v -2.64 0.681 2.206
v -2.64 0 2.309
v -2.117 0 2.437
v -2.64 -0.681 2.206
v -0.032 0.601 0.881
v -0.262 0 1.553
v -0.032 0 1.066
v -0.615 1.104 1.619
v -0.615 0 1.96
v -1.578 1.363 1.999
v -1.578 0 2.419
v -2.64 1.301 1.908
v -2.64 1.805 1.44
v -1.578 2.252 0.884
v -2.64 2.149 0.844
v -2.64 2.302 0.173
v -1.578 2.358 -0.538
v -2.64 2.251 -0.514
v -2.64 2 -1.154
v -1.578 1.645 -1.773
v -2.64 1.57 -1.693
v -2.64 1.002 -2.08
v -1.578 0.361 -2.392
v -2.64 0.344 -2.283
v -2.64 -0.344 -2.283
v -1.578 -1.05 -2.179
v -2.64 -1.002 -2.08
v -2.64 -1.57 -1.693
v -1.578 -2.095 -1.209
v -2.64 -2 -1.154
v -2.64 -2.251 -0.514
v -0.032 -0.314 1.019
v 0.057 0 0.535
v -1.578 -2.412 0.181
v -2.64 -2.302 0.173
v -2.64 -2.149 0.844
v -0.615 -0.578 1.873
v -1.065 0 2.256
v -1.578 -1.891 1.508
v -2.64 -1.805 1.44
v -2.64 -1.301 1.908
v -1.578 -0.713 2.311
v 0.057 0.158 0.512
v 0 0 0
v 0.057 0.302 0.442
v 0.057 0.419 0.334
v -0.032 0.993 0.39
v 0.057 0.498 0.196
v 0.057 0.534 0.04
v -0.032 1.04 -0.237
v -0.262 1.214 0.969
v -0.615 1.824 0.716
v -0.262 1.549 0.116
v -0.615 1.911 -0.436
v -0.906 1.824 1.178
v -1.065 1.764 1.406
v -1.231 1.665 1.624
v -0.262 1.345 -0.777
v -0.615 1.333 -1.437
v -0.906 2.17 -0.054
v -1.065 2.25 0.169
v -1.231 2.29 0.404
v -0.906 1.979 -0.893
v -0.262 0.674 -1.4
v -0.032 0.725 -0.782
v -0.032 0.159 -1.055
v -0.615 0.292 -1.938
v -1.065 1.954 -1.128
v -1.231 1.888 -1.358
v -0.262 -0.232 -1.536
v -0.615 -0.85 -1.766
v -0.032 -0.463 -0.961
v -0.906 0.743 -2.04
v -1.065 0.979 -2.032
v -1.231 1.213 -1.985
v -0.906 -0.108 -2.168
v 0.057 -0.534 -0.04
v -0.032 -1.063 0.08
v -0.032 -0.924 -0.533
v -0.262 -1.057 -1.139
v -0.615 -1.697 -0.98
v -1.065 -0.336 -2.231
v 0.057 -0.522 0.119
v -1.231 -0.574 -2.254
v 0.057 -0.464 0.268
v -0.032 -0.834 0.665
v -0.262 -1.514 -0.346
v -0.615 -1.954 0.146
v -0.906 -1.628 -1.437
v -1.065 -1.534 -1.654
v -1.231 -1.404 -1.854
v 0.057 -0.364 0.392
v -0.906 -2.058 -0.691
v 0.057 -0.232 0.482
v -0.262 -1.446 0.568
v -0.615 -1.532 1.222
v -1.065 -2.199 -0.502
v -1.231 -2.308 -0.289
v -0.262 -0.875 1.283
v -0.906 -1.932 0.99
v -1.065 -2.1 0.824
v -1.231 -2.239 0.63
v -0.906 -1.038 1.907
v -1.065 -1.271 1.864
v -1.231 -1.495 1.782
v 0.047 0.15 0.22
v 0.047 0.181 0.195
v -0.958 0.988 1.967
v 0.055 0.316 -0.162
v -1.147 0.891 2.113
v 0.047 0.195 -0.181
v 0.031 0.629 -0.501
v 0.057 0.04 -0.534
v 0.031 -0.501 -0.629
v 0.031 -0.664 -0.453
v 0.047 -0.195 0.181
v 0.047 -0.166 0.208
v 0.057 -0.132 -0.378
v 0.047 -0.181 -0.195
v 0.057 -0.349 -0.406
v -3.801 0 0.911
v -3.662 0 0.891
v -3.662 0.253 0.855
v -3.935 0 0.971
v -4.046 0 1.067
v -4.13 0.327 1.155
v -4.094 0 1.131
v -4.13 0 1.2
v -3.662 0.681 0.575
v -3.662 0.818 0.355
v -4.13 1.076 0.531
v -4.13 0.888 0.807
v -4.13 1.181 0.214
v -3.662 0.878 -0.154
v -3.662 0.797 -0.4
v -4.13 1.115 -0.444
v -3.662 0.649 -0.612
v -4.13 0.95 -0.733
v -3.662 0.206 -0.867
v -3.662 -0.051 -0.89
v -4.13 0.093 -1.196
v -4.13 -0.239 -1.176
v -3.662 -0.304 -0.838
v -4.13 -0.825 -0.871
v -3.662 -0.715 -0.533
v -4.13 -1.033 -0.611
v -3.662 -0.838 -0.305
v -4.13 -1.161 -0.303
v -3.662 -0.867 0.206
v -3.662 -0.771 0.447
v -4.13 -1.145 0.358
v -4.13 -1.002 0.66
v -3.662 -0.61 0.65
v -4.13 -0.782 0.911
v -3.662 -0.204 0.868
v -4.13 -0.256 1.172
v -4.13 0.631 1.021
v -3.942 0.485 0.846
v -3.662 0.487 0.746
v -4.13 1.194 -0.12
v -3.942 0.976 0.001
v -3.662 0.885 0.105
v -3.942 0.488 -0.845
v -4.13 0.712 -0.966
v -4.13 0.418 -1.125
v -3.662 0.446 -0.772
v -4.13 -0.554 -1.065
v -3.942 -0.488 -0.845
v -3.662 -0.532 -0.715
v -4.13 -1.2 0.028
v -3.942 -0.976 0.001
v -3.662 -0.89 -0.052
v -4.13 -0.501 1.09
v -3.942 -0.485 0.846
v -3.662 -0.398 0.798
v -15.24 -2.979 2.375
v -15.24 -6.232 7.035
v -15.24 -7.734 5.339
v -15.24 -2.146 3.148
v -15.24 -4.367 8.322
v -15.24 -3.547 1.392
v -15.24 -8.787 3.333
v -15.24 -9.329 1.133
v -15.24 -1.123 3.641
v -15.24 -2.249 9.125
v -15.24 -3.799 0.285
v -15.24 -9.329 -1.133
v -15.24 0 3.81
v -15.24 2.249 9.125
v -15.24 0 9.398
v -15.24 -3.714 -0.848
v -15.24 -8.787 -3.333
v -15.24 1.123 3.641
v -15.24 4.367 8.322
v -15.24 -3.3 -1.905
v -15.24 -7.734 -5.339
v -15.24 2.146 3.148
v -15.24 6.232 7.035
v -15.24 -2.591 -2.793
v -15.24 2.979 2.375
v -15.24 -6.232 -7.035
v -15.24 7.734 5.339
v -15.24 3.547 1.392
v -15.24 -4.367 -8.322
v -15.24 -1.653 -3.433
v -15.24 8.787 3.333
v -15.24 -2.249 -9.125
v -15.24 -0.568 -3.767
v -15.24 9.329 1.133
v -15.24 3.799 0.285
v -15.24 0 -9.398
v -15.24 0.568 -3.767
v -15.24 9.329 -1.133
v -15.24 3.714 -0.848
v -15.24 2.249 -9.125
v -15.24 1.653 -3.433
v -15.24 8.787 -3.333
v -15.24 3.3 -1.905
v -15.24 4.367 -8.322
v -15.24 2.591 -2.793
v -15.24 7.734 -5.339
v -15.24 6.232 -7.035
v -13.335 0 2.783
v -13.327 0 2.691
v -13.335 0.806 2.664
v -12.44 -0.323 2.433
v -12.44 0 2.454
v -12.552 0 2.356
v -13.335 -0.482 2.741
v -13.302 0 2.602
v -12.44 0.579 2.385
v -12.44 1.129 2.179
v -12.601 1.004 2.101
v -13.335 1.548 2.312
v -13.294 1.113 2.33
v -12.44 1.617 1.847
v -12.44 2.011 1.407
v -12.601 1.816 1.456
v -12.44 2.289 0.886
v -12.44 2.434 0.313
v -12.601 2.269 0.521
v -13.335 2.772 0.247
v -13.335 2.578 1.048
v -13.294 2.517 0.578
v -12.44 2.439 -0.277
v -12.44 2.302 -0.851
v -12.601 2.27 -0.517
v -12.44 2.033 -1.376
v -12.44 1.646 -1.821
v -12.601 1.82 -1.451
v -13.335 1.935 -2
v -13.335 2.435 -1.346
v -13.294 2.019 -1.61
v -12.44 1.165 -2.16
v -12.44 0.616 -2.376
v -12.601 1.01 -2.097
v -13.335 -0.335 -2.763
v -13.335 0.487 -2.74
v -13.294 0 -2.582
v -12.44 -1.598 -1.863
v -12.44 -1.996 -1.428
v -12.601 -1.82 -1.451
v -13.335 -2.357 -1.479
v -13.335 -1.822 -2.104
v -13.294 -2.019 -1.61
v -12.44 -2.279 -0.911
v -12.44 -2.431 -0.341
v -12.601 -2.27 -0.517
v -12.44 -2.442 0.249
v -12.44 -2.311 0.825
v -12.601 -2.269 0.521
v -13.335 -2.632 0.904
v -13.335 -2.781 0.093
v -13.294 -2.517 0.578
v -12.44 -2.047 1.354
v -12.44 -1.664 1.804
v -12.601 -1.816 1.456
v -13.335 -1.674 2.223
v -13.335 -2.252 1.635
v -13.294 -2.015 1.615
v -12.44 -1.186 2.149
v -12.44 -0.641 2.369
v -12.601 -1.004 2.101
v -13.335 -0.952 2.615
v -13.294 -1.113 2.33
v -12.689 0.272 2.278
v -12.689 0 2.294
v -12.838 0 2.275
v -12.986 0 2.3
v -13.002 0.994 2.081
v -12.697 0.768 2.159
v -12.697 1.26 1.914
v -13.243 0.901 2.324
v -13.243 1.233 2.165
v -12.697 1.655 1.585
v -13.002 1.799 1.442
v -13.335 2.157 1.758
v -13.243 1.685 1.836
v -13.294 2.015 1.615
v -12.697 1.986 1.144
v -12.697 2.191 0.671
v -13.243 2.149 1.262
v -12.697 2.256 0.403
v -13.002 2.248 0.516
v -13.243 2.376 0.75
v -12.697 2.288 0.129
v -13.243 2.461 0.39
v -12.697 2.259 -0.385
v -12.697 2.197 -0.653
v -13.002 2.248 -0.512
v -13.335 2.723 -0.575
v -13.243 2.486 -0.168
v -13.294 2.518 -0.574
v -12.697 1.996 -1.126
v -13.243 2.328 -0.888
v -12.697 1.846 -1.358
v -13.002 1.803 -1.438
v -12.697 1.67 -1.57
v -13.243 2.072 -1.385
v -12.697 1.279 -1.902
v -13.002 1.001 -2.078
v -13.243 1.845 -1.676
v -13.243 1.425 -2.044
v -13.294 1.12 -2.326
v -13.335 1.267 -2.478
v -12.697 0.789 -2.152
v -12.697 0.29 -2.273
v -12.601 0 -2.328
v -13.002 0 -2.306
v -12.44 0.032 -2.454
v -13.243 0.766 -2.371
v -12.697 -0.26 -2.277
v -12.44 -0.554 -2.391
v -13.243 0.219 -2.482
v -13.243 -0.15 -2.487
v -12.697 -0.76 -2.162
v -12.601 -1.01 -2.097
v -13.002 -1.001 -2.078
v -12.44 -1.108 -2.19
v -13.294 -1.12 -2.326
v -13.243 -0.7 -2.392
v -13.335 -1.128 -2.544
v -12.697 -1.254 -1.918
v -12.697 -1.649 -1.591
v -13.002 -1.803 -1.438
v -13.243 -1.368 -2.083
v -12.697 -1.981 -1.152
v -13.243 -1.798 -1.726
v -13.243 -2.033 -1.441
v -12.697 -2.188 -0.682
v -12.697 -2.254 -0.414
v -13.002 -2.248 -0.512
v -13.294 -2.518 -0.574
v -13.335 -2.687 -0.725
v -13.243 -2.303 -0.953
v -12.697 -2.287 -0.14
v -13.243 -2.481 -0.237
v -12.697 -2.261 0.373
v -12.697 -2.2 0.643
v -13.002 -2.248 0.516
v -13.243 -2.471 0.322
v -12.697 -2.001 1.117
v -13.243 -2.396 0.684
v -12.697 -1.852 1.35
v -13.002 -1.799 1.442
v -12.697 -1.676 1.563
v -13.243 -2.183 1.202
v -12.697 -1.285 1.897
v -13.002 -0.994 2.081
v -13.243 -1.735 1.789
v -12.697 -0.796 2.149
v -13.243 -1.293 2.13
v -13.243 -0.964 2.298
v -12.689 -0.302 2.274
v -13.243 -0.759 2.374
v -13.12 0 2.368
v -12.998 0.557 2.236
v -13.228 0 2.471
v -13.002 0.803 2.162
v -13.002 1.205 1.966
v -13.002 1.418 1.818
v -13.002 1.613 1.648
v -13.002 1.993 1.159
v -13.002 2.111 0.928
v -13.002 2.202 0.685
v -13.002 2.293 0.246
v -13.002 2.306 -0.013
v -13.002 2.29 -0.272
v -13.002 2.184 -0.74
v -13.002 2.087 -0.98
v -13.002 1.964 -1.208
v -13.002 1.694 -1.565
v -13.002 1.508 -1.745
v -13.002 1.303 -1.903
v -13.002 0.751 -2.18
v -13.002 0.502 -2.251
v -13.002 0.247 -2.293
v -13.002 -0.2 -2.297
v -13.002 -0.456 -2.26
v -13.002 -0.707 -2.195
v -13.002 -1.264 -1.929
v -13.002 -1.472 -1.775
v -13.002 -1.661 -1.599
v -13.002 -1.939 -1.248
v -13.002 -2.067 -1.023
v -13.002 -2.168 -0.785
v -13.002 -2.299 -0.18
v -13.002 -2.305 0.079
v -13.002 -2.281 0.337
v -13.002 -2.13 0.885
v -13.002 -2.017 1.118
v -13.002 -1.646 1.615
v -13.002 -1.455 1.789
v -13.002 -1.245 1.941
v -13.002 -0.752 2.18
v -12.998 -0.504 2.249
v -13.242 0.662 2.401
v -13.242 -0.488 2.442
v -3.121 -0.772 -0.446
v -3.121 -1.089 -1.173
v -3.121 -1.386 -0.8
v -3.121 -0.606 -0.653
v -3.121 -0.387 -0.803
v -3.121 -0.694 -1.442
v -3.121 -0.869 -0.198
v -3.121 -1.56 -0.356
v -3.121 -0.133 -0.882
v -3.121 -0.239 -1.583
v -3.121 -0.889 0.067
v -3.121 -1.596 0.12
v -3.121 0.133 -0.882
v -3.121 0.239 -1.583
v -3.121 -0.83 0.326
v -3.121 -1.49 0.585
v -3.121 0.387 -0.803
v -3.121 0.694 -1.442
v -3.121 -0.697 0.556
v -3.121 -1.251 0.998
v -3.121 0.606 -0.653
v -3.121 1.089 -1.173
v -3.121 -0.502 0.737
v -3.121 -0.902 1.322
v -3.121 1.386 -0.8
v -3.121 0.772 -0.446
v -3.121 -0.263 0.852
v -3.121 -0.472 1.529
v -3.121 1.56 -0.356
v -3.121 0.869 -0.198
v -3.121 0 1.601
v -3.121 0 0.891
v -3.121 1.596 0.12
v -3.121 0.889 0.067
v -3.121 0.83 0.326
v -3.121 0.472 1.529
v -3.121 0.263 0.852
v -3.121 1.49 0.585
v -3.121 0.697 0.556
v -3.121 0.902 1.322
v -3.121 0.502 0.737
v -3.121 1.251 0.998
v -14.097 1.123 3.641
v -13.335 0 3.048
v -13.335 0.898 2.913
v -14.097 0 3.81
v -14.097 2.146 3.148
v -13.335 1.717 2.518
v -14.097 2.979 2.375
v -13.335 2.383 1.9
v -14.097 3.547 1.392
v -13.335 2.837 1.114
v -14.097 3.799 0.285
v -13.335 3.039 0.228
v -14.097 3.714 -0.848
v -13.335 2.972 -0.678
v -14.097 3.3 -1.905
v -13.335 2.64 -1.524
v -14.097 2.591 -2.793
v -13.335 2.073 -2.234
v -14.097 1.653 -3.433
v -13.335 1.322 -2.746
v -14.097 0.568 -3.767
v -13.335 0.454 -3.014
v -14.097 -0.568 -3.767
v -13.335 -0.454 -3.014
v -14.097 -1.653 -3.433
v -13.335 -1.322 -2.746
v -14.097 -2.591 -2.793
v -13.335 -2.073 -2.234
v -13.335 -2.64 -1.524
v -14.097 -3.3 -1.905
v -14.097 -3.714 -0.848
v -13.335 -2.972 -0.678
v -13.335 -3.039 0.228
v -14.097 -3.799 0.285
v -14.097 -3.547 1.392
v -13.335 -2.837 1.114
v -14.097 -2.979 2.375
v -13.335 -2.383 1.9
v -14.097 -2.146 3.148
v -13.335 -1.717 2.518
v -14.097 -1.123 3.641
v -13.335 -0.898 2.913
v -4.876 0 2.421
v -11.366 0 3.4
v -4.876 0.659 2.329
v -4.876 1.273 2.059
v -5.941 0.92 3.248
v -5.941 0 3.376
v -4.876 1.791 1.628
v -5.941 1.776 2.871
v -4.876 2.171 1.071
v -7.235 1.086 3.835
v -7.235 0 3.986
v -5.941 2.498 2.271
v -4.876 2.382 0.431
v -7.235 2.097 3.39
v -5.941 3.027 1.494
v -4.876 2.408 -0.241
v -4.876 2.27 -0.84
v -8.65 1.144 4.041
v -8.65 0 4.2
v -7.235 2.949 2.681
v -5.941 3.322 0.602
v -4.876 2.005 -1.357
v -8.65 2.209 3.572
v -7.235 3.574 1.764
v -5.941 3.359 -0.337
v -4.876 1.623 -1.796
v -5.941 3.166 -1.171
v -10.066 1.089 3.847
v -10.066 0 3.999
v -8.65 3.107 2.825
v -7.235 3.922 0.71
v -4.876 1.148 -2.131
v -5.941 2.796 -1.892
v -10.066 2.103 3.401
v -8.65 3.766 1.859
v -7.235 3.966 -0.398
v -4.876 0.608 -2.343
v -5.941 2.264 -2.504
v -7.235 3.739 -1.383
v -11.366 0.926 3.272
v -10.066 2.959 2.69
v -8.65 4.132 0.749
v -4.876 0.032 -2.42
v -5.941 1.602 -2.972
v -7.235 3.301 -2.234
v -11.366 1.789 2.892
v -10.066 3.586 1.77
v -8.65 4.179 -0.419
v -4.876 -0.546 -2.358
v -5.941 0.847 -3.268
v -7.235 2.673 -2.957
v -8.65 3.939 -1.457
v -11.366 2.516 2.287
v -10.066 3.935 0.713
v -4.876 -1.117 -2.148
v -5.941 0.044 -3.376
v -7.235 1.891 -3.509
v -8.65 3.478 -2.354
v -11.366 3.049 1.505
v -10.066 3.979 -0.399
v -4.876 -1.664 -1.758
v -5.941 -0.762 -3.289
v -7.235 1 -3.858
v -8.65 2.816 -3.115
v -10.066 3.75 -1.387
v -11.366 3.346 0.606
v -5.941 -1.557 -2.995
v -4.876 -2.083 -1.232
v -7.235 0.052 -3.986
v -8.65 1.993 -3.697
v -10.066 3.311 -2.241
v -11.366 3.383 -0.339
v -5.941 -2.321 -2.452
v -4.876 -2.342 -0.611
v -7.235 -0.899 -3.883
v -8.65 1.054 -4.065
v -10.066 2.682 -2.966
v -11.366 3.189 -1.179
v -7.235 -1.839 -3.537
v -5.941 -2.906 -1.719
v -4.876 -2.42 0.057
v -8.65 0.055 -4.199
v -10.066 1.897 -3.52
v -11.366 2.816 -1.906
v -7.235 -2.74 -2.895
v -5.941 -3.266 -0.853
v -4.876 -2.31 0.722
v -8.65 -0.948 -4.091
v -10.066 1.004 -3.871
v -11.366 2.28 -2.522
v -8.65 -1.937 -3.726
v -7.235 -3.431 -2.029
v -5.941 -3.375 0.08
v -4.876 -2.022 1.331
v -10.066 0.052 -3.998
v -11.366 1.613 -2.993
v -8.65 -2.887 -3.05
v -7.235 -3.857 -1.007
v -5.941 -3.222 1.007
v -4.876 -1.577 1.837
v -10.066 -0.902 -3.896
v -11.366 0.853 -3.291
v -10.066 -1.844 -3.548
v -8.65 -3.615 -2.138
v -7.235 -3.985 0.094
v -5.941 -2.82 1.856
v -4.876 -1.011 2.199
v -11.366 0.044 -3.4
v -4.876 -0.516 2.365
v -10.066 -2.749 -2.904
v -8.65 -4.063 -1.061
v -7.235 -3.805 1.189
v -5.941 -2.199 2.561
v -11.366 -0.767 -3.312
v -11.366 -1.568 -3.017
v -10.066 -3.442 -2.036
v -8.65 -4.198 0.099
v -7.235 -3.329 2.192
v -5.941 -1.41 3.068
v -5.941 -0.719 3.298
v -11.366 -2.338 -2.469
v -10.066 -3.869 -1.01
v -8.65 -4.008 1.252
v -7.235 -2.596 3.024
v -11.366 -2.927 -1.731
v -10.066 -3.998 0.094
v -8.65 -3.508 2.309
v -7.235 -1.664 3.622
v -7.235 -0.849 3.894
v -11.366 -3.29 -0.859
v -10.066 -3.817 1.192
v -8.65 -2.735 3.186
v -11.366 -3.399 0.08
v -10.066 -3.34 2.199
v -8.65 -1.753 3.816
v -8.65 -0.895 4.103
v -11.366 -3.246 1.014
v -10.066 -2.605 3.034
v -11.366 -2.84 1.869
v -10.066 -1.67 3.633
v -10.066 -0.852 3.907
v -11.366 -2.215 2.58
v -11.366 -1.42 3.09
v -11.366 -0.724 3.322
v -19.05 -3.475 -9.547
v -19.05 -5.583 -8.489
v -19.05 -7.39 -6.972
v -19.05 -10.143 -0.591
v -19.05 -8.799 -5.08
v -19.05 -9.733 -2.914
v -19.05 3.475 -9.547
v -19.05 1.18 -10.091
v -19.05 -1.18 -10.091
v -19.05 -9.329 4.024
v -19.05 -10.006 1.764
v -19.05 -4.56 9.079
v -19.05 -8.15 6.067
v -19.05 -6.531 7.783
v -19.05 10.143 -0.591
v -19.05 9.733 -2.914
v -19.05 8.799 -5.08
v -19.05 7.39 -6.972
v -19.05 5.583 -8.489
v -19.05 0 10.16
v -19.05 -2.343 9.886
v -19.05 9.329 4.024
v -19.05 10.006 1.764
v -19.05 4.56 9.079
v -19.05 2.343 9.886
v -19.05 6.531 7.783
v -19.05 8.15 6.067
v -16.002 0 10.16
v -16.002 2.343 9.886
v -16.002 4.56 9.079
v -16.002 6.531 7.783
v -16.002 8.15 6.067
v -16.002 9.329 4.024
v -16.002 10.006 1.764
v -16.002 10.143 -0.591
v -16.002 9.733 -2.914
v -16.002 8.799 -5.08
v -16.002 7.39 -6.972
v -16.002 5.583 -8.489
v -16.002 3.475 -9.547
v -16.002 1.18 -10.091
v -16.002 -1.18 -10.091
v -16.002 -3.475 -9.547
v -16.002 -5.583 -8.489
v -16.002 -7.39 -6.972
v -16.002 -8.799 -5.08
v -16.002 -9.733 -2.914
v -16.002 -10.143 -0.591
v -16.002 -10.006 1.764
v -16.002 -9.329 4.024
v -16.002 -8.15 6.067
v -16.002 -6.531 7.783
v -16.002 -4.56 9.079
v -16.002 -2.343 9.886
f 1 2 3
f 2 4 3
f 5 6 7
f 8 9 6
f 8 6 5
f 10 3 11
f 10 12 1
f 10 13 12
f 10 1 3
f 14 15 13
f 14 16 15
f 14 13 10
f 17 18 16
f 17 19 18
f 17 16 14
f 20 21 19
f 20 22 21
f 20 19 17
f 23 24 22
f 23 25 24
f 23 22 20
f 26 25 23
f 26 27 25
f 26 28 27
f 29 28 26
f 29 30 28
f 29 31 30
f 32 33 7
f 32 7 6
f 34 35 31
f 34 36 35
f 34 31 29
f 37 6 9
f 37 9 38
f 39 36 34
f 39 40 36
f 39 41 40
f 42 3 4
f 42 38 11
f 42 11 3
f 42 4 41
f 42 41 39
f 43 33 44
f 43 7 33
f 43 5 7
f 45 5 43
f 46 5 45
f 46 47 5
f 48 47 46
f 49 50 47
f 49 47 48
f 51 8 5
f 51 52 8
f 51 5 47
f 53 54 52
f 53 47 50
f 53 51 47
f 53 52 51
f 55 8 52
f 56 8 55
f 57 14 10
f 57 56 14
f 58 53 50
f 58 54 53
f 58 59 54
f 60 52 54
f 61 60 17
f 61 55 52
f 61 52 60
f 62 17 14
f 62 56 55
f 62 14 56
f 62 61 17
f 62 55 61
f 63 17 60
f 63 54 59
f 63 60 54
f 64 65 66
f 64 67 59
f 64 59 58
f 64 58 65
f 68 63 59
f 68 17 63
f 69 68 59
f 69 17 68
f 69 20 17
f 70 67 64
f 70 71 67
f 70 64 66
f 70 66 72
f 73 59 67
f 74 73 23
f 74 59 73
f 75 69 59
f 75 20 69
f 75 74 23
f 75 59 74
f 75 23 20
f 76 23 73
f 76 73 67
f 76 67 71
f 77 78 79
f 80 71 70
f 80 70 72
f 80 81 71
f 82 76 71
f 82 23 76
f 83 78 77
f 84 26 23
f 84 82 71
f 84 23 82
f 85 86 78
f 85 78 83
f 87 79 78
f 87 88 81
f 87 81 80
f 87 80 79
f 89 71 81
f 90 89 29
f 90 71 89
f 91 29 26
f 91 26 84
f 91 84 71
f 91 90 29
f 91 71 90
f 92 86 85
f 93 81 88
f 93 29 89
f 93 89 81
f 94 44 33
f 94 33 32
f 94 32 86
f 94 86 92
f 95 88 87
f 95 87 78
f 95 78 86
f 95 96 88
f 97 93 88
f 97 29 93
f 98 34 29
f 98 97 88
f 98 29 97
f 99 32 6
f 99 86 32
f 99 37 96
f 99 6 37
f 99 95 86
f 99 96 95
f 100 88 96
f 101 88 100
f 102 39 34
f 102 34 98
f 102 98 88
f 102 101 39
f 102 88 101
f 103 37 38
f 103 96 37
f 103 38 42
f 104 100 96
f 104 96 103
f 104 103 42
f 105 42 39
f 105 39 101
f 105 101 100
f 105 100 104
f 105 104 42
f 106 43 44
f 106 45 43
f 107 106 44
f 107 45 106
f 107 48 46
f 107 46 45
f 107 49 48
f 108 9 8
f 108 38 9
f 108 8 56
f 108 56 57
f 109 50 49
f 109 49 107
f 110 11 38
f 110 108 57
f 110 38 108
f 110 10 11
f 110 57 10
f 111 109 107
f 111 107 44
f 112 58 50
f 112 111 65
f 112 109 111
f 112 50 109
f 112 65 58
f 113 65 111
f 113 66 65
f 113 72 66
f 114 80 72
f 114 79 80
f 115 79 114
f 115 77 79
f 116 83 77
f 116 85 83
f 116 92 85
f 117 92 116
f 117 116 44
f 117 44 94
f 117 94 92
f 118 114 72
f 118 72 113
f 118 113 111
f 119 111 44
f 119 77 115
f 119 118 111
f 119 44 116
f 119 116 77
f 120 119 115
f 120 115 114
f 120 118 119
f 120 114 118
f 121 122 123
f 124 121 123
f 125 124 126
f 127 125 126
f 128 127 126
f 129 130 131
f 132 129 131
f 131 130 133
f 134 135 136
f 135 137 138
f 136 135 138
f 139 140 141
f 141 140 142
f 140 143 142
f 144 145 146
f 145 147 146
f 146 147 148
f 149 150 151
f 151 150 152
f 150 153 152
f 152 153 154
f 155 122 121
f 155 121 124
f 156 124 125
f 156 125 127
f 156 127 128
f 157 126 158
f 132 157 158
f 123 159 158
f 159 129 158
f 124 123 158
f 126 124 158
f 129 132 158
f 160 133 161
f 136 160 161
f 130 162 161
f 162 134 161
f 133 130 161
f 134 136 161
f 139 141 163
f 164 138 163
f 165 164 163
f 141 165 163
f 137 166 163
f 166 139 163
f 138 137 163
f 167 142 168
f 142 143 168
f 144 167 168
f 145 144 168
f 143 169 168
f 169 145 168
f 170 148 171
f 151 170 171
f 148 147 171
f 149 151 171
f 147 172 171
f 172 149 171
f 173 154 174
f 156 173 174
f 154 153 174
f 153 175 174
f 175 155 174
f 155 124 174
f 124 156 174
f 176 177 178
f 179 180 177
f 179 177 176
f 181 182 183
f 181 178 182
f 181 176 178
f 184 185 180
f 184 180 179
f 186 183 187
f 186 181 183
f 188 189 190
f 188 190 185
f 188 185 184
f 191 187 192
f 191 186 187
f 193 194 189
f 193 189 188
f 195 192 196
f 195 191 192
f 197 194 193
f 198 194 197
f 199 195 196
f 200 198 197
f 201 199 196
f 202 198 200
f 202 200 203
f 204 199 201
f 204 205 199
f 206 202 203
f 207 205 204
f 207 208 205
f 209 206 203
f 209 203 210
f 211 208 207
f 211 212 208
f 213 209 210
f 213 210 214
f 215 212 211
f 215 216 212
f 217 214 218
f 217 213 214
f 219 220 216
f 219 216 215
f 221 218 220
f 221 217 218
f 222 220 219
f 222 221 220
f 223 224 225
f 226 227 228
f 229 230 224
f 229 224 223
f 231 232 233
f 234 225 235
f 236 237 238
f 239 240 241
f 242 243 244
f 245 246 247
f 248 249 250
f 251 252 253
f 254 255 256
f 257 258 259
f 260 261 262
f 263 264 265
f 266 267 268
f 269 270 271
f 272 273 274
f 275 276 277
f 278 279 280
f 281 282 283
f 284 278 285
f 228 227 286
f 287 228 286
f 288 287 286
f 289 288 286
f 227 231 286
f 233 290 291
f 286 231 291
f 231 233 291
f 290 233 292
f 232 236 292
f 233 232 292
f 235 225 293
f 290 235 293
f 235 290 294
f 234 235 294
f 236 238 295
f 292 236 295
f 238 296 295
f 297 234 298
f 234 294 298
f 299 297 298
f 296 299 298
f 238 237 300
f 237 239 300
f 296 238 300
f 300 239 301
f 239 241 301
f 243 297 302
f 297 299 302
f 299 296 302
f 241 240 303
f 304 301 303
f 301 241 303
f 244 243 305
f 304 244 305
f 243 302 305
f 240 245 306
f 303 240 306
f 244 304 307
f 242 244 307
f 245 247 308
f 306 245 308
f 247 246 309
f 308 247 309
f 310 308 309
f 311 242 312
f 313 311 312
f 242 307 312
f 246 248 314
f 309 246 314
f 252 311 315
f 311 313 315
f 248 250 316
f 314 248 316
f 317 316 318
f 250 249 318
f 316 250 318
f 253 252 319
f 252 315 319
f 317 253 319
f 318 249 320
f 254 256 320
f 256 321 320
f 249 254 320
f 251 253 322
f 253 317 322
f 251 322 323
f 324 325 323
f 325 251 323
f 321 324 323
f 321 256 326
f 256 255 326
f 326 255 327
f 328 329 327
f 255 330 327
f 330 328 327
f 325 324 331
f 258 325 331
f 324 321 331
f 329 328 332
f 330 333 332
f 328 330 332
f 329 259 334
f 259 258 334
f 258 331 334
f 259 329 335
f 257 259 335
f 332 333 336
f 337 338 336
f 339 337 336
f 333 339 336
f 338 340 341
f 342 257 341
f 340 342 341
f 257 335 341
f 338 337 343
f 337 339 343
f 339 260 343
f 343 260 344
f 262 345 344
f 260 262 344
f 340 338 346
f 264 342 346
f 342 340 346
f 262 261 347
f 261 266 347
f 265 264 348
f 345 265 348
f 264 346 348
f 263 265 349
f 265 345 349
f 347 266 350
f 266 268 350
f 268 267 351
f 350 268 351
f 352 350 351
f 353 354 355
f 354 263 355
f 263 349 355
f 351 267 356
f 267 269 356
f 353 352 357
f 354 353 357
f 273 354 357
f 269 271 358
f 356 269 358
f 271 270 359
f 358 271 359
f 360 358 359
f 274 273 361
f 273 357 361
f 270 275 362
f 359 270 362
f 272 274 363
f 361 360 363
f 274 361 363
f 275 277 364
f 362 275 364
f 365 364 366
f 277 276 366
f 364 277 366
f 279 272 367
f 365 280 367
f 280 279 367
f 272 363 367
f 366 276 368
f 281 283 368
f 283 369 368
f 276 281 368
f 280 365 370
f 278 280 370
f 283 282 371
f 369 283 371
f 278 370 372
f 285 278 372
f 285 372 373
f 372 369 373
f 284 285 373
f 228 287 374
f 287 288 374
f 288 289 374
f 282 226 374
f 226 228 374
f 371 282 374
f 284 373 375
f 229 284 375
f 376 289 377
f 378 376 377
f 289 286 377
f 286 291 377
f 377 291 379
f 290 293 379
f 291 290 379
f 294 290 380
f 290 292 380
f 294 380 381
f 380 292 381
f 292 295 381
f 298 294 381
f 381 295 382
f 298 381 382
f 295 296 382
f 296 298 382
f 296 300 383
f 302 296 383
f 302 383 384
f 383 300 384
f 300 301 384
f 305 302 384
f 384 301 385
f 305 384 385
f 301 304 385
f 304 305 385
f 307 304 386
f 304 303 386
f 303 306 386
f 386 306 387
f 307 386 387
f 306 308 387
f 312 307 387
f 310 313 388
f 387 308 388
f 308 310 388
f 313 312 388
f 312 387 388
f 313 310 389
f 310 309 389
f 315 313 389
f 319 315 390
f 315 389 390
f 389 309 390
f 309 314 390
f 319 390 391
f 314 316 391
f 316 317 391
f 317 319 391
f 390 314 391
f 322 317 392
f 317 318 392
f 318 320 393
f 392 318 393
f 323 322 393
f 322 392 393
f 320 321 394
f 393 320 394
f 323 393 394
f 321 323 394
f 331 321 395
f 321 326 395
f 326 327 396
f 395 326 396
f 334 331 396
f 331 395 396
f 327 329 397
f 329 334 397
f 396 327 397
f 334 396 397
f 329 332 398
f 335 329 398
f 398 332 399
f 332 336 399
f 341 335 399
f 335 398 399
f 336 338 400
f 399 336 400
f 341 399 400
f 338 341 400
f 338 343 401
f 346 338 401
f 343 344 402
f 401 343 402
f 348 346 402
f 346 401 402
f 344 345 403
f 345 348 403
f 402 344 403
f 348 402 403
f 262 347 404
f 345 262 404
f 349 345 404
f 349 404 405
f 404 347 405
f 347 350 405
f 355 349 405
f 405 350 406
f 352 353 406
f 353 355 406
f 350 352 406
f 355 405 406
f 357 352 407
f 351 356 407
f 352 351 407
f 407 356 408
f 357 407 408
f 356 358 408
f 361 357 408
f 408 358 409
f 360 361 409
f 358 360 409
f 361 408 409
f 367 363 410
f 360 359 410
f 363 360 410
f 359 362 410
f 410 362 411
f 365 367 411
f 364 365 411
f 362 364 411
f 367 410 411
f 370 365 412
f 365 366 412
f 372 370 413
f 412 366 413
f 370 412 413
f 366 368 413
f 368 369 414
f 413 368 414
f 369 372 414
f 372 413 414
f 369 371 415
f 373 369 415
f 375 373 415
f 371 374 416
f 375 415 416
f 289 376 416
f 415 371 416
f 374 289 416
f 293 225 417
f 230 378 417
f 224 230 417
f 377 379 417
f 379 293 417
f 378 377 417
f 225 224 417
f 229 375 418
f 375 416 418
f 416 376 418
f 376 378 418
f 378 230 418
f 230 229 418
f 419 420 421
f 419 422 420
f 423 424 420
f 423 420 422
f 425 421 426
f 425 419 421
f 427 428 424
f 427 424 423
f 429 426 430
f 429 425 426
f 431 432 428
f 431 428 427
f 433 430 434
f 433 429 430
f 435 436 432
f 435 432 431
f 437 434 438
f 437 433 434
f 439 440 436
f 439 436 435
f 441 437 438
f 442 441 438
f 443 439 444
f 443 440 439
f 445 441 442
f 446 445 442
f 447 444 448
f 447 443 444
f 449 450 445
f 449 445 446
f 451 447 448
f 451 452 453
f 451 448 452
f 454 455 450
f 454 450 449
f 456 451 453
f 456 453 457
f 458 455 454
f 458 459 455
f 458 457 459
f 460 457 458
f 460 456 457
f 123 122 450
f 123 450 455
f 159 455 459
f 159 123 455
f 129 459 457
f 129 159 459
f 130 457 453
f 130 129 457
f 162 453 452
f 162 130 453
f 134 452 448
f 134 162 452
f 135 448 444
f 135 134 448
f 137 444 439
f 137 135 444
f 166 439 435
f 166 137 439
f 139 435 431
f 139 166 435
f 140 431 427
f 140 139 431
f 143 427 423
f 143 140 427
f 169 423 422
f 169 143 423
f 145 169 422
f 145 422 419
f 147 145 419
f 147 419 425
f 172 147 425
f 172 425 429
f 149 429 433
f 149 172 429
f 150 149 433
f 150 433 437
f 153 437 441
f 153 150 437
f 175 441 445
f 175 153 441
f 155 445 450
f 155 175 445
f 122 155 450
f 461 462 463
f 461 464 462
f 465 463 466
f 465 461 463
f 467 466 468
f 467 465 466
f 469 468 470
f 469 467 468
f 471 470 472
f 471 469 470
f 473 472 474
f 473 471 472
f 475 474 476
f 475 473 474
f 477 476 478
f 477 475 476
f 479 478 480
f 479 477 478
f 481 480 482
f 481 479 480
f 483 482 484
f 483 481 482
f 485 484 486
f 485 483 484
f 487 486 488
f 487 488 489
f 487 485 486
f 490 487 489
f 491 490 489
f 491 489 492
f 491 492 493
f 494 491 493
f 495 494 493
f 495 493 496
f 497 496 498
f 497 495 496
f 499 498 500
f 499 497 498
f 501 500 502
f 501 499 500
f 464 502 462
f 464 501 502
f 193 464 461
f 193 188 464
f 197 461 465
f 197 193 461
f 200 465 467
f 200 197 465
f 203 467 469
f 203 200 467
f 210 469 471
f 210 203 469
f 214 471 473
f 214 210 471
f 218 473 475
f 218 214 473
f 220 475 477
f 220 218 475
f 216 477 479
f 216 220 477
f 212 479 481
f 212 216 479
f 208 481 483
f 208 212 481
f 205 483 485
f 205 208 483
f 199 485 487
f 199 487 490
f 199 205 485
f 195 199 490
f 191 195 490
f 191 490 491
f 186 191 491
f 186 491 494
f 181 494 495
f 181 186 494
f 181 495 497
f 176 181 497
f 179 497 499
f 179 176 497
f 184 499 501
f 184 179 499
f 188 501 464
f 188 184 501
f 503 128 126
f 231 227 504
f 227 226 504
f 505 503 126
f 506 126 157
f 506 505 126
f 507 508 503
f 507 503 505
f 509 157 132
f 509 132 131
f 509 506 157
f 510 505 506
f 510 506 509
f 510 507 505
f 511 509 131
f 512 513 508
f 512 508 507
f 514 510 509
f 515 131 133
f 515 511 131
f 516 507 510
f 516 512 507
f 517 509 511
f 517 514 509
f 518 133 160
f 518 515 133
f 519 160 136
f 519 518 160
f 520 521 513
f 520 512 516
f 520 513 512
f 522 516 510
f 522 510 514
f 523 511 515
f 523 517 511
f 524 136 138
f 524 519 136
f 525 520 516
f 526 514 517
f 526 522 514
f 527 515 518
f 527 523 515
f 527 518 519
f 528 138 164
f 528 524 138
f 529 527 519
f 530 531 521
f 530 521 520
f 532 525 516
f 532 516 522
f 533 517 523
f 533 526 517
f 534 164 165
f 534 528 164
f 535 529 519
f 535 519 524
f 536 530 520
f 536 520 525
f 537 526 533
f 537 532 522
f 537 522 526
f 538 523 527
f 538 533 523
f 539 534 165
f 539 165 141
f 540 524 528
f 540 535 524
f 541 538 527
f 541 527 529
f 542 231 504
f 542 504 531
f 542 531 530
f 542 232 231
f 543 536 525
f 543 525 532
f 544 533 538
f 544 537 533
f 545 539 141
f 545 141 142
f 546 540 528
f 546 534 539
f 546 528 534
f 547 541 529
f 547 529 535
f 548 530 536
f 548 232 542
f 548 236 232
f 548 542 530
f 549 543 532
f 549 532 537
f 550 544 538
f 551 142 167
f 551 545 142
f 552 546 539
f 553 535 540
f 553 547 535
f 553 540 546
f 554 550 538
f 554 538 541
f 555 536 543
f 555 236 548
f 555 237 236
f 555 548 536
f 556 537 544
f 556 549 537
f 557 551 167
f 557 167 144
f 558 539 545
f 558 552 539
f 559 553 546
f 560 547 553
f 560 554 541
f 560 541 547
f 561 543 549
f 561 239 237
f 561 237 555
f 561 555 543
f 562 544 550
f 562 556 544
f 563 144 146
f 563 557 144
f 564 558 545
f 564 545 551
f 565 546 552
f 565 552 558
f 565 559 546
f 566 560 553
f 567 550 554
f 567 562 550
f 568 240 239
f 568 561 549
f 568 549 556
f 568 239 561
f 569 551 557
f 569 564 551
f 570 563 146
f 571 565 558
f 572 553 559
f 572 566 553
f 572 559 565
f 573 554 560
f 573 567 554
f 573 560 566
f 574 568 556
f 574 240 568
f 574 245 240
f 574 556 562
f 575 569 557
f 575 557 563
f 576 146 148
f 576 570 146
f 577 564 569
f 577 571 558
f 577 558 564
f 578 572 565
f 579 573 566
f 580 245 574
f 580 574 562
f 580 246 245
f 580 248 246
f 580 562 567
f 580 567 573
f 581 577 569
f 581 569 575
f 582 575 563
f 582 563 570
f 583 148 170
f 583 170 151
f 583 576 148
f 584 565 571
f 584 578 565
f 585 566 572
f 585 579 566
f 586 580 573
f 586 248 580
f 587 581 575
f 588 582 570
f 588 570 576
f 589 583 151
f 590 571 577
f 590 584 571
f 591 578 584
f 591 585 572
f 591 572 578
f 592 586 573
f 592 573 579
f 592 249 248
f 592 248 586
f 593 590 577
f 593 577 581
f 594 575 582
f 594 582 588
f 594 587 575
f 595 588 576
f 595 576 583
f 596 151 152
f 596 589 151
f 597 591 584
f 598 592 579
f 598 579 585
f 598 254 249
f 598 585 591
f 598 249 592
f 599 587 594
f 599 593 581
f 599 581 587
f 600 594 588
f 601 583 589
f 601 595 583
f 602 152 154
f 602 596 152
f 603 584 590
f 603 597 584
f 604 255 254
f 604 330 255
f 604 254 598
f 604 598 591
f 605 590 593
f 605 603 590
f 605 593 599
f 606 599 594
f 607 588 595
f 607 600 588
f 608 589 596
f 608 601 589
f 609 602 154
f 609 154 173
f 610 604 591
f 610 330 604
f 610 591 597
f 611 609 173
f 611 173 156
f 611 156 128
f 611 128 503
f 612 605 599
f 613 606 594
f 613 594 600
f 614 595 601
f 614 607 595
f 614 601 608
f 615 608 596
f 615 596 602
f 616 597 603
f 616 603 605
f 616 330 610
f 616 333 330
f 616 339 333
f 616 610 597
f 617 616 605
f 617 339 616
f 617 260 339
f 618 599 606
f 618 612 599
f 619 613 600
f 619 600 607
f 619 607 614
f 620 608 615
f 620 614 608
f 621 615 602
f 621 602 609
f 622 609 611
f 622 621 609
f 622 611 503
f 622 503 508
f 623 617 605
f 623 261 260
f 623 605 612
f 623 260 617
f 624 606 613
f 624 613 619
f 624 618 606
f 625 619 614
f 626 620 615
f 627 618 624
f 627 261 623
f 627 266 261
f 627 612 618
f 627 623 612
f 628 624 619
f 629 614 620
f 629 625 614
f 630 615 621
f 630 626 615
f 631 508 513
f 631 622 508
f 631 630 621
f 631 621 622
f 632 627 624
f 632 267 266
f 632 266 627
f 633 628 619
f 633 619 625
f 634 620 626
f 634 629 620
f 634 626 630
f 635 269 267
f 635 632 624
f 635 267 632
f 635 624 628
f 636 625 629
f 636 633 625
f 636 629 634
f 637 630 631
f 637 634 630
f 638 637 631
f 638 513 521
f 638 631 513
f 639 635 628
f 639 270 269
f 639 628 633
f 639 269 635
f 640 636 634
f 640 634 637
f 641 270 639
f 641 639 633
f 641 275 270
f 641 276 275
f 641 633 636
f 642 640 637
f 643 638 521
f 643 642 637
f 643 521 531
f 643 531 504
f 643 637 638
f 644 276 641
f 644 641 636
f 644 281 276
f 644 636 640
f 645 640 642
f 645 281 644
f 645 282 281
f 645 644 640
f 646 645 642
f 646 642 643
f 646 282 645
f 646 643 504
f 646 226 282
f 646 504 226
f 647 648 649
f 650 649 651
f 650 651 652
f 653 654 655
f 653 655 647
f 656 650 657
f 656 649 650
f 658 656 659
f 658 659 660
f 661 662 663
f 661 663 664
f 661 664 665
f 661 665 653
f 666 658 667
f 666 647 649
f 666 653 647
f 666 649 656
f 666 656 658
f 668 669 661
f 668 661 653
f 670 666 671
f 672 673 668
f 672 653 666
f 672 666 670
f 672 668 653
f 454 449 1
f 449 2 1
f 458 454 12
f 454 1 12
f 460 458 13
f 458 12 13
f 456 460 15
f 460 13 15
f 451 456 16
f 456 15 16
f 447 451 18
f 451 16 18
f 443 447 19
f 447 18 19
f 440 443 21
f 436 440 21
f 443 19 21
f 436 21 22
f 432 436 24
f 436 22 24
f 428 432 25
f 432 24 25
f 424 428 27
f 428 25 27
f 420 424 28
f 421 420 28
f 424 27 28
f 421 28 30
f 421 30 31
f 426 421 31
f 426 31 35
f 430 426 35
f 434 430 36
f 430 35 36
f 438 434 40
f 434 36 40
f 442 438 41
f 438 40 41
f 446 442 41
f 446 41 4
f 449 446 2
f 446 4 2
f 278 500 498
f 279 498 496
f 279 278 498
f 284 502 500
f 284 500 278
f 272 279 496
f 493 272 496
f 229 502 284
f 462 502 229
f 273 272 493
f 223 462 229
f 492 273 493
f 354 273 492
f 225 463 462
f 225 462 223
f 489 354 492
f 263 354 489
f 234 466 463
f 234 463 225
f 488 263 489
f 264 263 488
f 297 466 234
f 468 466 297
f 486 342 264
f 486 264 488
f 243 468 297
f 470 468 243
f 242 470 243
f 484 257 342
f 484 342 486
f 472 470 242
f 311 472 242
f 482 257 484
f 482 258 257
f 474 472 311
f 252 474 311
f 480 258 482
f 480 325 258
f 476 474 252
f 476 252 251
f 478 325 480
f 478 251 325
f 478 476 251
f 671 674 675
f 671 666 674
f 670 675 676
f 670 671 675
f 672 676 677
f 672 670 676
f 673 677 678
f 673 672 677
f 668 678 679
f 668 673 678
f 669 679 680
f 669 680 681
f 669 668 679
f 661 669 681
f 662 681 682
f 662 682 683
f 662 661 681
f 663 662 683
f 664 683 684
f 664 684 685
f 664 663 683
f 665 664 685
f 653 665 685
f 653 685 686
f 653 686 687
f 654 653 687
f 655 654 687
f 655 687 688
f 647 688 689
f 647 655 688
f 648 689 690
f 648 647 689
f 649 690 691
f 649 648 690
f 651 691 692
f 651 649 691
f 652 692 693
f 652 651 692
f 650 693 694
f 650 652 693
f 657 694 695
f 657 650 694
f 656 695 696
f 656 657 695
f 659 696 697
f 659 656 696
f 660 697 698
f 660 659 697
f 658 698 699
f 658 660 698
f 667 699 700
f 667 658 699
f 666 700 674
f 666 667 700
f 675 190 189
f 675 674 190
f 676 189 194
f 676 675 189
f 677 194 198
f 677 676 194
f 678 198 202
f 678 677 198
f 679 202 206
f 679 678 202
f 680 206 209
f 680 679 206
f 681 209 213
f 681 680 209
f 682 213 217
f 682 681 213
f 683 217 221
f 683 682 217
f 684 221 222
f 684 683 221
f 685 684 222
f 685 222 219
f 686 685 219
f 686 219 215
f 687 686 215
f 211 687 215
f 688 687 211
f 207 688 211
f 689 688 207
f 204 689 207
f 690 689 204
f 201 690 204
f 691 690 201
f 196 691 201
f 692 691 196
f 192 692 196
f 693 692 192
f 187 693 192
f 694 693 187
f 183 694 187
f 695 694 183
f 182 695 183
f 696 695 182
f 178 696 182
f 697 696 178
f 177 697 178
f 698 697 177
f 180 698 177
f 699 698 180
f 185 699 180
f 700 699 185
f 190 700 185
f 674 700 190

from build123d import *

# Parameters (mm, degrees)
F2_R = 0.508


# Not quite as in the source:
# - a fillet or chamfer that OpenCascade refuses, or shapes differently, is made with other operations: its cross-section is extruded or revolved along the edge and cut away or added


with BuildPart() as f1:
    # F0 (on Front) → F1 (revolve)
    with BuildSketch(Plane.XZ):
        with BuildLine():
            Line((-19.05, 0), (0, 0))
            ThreePointArc((0, 0), (-0.8365584984, 2.1276164223), (-3.1208319045, 2.034467252))
            Line((-3.1208319045, 2.034467252), (-3.1208319045, 0.891467252))
            Line((-3.1208319045, 0.891467252), (-4.0098319045, 0.891467252))
            ThreePointArc((-4.0098319045, 0.891467252), (-8.6732915332, 4.1995590152), (-13.335, 0.889))
            Line((-13.335, 0.889), (-13.335, 3.81))
            Line((-13.335, 3.81), (-15.24, 3.81))
            Line((-15.24, 3.81), (-15.24, 10.16))
            Line((-15.24, 10.16), (-19.05, 10.16))
            Line((-19.05, 10.16), (-19.05, 0))
        make_face()
    revolve(axis=Axis((-9.525, 0, 0), (-1, 0, 0)))

    # F2
    f2_edges = [f1.edges().sort_by_distance(p)[0] for p in [
        (-4.009832, 0, -0.891467),
        (-13.335, 0, -0.889),
        (-8.673292, 0, 4.199559),
    ]]
    fillet(f2_edges, radius=F2_R)

    # F3: chamfer of 0.762 on 3 edges, made by hand

    # F3_s1 → F3_t2 (revolve, cut)
    with BuildSketch(Plane.XZ):
        Polygon((-15.24, 9.398), (-16.002, 10.16), (-15.24, 10.16), align=None)
    revolve(axis=Axis((-15.24, 0, 0), (-1, 0, 0)), mode=Mode.SUBTRACT)

    # F3_s3 → F3_t4 (revolve, cut)
    with BuildSketch(Plane.XZ):
        Polygon((-13.335, 3.048), (-14.097, 3.81), (-13.335, 3.81), align=None)
    revolve(axis=Axis((-13.335, 0, 0), (-1, 0, 0)), mode=Mode.SUBTRACT)

    # F3_s5 → F3_t6 (revolve, cut)
    with BuildSketch(Plane.XZ):
        with BuildLine():
            Line((-3.1208319045, 1.600505207), (-2.6395418811, 2.3089160405))
            ThreePointArc((-2.6395418811, 2.3089160405), (-2.8778866419, 2.1954632748), (-3.1208319045, 2.034467252))
            Line((-3.1208319045, 2.034467252), (-3.1208319045, 1.600505207))
        make_face()
    revolve(axis=Axis((-3.1208319045, 0, 0), (-1, 0, 0)), mode=Mode.SUBTRACT)


solid = f1.part
